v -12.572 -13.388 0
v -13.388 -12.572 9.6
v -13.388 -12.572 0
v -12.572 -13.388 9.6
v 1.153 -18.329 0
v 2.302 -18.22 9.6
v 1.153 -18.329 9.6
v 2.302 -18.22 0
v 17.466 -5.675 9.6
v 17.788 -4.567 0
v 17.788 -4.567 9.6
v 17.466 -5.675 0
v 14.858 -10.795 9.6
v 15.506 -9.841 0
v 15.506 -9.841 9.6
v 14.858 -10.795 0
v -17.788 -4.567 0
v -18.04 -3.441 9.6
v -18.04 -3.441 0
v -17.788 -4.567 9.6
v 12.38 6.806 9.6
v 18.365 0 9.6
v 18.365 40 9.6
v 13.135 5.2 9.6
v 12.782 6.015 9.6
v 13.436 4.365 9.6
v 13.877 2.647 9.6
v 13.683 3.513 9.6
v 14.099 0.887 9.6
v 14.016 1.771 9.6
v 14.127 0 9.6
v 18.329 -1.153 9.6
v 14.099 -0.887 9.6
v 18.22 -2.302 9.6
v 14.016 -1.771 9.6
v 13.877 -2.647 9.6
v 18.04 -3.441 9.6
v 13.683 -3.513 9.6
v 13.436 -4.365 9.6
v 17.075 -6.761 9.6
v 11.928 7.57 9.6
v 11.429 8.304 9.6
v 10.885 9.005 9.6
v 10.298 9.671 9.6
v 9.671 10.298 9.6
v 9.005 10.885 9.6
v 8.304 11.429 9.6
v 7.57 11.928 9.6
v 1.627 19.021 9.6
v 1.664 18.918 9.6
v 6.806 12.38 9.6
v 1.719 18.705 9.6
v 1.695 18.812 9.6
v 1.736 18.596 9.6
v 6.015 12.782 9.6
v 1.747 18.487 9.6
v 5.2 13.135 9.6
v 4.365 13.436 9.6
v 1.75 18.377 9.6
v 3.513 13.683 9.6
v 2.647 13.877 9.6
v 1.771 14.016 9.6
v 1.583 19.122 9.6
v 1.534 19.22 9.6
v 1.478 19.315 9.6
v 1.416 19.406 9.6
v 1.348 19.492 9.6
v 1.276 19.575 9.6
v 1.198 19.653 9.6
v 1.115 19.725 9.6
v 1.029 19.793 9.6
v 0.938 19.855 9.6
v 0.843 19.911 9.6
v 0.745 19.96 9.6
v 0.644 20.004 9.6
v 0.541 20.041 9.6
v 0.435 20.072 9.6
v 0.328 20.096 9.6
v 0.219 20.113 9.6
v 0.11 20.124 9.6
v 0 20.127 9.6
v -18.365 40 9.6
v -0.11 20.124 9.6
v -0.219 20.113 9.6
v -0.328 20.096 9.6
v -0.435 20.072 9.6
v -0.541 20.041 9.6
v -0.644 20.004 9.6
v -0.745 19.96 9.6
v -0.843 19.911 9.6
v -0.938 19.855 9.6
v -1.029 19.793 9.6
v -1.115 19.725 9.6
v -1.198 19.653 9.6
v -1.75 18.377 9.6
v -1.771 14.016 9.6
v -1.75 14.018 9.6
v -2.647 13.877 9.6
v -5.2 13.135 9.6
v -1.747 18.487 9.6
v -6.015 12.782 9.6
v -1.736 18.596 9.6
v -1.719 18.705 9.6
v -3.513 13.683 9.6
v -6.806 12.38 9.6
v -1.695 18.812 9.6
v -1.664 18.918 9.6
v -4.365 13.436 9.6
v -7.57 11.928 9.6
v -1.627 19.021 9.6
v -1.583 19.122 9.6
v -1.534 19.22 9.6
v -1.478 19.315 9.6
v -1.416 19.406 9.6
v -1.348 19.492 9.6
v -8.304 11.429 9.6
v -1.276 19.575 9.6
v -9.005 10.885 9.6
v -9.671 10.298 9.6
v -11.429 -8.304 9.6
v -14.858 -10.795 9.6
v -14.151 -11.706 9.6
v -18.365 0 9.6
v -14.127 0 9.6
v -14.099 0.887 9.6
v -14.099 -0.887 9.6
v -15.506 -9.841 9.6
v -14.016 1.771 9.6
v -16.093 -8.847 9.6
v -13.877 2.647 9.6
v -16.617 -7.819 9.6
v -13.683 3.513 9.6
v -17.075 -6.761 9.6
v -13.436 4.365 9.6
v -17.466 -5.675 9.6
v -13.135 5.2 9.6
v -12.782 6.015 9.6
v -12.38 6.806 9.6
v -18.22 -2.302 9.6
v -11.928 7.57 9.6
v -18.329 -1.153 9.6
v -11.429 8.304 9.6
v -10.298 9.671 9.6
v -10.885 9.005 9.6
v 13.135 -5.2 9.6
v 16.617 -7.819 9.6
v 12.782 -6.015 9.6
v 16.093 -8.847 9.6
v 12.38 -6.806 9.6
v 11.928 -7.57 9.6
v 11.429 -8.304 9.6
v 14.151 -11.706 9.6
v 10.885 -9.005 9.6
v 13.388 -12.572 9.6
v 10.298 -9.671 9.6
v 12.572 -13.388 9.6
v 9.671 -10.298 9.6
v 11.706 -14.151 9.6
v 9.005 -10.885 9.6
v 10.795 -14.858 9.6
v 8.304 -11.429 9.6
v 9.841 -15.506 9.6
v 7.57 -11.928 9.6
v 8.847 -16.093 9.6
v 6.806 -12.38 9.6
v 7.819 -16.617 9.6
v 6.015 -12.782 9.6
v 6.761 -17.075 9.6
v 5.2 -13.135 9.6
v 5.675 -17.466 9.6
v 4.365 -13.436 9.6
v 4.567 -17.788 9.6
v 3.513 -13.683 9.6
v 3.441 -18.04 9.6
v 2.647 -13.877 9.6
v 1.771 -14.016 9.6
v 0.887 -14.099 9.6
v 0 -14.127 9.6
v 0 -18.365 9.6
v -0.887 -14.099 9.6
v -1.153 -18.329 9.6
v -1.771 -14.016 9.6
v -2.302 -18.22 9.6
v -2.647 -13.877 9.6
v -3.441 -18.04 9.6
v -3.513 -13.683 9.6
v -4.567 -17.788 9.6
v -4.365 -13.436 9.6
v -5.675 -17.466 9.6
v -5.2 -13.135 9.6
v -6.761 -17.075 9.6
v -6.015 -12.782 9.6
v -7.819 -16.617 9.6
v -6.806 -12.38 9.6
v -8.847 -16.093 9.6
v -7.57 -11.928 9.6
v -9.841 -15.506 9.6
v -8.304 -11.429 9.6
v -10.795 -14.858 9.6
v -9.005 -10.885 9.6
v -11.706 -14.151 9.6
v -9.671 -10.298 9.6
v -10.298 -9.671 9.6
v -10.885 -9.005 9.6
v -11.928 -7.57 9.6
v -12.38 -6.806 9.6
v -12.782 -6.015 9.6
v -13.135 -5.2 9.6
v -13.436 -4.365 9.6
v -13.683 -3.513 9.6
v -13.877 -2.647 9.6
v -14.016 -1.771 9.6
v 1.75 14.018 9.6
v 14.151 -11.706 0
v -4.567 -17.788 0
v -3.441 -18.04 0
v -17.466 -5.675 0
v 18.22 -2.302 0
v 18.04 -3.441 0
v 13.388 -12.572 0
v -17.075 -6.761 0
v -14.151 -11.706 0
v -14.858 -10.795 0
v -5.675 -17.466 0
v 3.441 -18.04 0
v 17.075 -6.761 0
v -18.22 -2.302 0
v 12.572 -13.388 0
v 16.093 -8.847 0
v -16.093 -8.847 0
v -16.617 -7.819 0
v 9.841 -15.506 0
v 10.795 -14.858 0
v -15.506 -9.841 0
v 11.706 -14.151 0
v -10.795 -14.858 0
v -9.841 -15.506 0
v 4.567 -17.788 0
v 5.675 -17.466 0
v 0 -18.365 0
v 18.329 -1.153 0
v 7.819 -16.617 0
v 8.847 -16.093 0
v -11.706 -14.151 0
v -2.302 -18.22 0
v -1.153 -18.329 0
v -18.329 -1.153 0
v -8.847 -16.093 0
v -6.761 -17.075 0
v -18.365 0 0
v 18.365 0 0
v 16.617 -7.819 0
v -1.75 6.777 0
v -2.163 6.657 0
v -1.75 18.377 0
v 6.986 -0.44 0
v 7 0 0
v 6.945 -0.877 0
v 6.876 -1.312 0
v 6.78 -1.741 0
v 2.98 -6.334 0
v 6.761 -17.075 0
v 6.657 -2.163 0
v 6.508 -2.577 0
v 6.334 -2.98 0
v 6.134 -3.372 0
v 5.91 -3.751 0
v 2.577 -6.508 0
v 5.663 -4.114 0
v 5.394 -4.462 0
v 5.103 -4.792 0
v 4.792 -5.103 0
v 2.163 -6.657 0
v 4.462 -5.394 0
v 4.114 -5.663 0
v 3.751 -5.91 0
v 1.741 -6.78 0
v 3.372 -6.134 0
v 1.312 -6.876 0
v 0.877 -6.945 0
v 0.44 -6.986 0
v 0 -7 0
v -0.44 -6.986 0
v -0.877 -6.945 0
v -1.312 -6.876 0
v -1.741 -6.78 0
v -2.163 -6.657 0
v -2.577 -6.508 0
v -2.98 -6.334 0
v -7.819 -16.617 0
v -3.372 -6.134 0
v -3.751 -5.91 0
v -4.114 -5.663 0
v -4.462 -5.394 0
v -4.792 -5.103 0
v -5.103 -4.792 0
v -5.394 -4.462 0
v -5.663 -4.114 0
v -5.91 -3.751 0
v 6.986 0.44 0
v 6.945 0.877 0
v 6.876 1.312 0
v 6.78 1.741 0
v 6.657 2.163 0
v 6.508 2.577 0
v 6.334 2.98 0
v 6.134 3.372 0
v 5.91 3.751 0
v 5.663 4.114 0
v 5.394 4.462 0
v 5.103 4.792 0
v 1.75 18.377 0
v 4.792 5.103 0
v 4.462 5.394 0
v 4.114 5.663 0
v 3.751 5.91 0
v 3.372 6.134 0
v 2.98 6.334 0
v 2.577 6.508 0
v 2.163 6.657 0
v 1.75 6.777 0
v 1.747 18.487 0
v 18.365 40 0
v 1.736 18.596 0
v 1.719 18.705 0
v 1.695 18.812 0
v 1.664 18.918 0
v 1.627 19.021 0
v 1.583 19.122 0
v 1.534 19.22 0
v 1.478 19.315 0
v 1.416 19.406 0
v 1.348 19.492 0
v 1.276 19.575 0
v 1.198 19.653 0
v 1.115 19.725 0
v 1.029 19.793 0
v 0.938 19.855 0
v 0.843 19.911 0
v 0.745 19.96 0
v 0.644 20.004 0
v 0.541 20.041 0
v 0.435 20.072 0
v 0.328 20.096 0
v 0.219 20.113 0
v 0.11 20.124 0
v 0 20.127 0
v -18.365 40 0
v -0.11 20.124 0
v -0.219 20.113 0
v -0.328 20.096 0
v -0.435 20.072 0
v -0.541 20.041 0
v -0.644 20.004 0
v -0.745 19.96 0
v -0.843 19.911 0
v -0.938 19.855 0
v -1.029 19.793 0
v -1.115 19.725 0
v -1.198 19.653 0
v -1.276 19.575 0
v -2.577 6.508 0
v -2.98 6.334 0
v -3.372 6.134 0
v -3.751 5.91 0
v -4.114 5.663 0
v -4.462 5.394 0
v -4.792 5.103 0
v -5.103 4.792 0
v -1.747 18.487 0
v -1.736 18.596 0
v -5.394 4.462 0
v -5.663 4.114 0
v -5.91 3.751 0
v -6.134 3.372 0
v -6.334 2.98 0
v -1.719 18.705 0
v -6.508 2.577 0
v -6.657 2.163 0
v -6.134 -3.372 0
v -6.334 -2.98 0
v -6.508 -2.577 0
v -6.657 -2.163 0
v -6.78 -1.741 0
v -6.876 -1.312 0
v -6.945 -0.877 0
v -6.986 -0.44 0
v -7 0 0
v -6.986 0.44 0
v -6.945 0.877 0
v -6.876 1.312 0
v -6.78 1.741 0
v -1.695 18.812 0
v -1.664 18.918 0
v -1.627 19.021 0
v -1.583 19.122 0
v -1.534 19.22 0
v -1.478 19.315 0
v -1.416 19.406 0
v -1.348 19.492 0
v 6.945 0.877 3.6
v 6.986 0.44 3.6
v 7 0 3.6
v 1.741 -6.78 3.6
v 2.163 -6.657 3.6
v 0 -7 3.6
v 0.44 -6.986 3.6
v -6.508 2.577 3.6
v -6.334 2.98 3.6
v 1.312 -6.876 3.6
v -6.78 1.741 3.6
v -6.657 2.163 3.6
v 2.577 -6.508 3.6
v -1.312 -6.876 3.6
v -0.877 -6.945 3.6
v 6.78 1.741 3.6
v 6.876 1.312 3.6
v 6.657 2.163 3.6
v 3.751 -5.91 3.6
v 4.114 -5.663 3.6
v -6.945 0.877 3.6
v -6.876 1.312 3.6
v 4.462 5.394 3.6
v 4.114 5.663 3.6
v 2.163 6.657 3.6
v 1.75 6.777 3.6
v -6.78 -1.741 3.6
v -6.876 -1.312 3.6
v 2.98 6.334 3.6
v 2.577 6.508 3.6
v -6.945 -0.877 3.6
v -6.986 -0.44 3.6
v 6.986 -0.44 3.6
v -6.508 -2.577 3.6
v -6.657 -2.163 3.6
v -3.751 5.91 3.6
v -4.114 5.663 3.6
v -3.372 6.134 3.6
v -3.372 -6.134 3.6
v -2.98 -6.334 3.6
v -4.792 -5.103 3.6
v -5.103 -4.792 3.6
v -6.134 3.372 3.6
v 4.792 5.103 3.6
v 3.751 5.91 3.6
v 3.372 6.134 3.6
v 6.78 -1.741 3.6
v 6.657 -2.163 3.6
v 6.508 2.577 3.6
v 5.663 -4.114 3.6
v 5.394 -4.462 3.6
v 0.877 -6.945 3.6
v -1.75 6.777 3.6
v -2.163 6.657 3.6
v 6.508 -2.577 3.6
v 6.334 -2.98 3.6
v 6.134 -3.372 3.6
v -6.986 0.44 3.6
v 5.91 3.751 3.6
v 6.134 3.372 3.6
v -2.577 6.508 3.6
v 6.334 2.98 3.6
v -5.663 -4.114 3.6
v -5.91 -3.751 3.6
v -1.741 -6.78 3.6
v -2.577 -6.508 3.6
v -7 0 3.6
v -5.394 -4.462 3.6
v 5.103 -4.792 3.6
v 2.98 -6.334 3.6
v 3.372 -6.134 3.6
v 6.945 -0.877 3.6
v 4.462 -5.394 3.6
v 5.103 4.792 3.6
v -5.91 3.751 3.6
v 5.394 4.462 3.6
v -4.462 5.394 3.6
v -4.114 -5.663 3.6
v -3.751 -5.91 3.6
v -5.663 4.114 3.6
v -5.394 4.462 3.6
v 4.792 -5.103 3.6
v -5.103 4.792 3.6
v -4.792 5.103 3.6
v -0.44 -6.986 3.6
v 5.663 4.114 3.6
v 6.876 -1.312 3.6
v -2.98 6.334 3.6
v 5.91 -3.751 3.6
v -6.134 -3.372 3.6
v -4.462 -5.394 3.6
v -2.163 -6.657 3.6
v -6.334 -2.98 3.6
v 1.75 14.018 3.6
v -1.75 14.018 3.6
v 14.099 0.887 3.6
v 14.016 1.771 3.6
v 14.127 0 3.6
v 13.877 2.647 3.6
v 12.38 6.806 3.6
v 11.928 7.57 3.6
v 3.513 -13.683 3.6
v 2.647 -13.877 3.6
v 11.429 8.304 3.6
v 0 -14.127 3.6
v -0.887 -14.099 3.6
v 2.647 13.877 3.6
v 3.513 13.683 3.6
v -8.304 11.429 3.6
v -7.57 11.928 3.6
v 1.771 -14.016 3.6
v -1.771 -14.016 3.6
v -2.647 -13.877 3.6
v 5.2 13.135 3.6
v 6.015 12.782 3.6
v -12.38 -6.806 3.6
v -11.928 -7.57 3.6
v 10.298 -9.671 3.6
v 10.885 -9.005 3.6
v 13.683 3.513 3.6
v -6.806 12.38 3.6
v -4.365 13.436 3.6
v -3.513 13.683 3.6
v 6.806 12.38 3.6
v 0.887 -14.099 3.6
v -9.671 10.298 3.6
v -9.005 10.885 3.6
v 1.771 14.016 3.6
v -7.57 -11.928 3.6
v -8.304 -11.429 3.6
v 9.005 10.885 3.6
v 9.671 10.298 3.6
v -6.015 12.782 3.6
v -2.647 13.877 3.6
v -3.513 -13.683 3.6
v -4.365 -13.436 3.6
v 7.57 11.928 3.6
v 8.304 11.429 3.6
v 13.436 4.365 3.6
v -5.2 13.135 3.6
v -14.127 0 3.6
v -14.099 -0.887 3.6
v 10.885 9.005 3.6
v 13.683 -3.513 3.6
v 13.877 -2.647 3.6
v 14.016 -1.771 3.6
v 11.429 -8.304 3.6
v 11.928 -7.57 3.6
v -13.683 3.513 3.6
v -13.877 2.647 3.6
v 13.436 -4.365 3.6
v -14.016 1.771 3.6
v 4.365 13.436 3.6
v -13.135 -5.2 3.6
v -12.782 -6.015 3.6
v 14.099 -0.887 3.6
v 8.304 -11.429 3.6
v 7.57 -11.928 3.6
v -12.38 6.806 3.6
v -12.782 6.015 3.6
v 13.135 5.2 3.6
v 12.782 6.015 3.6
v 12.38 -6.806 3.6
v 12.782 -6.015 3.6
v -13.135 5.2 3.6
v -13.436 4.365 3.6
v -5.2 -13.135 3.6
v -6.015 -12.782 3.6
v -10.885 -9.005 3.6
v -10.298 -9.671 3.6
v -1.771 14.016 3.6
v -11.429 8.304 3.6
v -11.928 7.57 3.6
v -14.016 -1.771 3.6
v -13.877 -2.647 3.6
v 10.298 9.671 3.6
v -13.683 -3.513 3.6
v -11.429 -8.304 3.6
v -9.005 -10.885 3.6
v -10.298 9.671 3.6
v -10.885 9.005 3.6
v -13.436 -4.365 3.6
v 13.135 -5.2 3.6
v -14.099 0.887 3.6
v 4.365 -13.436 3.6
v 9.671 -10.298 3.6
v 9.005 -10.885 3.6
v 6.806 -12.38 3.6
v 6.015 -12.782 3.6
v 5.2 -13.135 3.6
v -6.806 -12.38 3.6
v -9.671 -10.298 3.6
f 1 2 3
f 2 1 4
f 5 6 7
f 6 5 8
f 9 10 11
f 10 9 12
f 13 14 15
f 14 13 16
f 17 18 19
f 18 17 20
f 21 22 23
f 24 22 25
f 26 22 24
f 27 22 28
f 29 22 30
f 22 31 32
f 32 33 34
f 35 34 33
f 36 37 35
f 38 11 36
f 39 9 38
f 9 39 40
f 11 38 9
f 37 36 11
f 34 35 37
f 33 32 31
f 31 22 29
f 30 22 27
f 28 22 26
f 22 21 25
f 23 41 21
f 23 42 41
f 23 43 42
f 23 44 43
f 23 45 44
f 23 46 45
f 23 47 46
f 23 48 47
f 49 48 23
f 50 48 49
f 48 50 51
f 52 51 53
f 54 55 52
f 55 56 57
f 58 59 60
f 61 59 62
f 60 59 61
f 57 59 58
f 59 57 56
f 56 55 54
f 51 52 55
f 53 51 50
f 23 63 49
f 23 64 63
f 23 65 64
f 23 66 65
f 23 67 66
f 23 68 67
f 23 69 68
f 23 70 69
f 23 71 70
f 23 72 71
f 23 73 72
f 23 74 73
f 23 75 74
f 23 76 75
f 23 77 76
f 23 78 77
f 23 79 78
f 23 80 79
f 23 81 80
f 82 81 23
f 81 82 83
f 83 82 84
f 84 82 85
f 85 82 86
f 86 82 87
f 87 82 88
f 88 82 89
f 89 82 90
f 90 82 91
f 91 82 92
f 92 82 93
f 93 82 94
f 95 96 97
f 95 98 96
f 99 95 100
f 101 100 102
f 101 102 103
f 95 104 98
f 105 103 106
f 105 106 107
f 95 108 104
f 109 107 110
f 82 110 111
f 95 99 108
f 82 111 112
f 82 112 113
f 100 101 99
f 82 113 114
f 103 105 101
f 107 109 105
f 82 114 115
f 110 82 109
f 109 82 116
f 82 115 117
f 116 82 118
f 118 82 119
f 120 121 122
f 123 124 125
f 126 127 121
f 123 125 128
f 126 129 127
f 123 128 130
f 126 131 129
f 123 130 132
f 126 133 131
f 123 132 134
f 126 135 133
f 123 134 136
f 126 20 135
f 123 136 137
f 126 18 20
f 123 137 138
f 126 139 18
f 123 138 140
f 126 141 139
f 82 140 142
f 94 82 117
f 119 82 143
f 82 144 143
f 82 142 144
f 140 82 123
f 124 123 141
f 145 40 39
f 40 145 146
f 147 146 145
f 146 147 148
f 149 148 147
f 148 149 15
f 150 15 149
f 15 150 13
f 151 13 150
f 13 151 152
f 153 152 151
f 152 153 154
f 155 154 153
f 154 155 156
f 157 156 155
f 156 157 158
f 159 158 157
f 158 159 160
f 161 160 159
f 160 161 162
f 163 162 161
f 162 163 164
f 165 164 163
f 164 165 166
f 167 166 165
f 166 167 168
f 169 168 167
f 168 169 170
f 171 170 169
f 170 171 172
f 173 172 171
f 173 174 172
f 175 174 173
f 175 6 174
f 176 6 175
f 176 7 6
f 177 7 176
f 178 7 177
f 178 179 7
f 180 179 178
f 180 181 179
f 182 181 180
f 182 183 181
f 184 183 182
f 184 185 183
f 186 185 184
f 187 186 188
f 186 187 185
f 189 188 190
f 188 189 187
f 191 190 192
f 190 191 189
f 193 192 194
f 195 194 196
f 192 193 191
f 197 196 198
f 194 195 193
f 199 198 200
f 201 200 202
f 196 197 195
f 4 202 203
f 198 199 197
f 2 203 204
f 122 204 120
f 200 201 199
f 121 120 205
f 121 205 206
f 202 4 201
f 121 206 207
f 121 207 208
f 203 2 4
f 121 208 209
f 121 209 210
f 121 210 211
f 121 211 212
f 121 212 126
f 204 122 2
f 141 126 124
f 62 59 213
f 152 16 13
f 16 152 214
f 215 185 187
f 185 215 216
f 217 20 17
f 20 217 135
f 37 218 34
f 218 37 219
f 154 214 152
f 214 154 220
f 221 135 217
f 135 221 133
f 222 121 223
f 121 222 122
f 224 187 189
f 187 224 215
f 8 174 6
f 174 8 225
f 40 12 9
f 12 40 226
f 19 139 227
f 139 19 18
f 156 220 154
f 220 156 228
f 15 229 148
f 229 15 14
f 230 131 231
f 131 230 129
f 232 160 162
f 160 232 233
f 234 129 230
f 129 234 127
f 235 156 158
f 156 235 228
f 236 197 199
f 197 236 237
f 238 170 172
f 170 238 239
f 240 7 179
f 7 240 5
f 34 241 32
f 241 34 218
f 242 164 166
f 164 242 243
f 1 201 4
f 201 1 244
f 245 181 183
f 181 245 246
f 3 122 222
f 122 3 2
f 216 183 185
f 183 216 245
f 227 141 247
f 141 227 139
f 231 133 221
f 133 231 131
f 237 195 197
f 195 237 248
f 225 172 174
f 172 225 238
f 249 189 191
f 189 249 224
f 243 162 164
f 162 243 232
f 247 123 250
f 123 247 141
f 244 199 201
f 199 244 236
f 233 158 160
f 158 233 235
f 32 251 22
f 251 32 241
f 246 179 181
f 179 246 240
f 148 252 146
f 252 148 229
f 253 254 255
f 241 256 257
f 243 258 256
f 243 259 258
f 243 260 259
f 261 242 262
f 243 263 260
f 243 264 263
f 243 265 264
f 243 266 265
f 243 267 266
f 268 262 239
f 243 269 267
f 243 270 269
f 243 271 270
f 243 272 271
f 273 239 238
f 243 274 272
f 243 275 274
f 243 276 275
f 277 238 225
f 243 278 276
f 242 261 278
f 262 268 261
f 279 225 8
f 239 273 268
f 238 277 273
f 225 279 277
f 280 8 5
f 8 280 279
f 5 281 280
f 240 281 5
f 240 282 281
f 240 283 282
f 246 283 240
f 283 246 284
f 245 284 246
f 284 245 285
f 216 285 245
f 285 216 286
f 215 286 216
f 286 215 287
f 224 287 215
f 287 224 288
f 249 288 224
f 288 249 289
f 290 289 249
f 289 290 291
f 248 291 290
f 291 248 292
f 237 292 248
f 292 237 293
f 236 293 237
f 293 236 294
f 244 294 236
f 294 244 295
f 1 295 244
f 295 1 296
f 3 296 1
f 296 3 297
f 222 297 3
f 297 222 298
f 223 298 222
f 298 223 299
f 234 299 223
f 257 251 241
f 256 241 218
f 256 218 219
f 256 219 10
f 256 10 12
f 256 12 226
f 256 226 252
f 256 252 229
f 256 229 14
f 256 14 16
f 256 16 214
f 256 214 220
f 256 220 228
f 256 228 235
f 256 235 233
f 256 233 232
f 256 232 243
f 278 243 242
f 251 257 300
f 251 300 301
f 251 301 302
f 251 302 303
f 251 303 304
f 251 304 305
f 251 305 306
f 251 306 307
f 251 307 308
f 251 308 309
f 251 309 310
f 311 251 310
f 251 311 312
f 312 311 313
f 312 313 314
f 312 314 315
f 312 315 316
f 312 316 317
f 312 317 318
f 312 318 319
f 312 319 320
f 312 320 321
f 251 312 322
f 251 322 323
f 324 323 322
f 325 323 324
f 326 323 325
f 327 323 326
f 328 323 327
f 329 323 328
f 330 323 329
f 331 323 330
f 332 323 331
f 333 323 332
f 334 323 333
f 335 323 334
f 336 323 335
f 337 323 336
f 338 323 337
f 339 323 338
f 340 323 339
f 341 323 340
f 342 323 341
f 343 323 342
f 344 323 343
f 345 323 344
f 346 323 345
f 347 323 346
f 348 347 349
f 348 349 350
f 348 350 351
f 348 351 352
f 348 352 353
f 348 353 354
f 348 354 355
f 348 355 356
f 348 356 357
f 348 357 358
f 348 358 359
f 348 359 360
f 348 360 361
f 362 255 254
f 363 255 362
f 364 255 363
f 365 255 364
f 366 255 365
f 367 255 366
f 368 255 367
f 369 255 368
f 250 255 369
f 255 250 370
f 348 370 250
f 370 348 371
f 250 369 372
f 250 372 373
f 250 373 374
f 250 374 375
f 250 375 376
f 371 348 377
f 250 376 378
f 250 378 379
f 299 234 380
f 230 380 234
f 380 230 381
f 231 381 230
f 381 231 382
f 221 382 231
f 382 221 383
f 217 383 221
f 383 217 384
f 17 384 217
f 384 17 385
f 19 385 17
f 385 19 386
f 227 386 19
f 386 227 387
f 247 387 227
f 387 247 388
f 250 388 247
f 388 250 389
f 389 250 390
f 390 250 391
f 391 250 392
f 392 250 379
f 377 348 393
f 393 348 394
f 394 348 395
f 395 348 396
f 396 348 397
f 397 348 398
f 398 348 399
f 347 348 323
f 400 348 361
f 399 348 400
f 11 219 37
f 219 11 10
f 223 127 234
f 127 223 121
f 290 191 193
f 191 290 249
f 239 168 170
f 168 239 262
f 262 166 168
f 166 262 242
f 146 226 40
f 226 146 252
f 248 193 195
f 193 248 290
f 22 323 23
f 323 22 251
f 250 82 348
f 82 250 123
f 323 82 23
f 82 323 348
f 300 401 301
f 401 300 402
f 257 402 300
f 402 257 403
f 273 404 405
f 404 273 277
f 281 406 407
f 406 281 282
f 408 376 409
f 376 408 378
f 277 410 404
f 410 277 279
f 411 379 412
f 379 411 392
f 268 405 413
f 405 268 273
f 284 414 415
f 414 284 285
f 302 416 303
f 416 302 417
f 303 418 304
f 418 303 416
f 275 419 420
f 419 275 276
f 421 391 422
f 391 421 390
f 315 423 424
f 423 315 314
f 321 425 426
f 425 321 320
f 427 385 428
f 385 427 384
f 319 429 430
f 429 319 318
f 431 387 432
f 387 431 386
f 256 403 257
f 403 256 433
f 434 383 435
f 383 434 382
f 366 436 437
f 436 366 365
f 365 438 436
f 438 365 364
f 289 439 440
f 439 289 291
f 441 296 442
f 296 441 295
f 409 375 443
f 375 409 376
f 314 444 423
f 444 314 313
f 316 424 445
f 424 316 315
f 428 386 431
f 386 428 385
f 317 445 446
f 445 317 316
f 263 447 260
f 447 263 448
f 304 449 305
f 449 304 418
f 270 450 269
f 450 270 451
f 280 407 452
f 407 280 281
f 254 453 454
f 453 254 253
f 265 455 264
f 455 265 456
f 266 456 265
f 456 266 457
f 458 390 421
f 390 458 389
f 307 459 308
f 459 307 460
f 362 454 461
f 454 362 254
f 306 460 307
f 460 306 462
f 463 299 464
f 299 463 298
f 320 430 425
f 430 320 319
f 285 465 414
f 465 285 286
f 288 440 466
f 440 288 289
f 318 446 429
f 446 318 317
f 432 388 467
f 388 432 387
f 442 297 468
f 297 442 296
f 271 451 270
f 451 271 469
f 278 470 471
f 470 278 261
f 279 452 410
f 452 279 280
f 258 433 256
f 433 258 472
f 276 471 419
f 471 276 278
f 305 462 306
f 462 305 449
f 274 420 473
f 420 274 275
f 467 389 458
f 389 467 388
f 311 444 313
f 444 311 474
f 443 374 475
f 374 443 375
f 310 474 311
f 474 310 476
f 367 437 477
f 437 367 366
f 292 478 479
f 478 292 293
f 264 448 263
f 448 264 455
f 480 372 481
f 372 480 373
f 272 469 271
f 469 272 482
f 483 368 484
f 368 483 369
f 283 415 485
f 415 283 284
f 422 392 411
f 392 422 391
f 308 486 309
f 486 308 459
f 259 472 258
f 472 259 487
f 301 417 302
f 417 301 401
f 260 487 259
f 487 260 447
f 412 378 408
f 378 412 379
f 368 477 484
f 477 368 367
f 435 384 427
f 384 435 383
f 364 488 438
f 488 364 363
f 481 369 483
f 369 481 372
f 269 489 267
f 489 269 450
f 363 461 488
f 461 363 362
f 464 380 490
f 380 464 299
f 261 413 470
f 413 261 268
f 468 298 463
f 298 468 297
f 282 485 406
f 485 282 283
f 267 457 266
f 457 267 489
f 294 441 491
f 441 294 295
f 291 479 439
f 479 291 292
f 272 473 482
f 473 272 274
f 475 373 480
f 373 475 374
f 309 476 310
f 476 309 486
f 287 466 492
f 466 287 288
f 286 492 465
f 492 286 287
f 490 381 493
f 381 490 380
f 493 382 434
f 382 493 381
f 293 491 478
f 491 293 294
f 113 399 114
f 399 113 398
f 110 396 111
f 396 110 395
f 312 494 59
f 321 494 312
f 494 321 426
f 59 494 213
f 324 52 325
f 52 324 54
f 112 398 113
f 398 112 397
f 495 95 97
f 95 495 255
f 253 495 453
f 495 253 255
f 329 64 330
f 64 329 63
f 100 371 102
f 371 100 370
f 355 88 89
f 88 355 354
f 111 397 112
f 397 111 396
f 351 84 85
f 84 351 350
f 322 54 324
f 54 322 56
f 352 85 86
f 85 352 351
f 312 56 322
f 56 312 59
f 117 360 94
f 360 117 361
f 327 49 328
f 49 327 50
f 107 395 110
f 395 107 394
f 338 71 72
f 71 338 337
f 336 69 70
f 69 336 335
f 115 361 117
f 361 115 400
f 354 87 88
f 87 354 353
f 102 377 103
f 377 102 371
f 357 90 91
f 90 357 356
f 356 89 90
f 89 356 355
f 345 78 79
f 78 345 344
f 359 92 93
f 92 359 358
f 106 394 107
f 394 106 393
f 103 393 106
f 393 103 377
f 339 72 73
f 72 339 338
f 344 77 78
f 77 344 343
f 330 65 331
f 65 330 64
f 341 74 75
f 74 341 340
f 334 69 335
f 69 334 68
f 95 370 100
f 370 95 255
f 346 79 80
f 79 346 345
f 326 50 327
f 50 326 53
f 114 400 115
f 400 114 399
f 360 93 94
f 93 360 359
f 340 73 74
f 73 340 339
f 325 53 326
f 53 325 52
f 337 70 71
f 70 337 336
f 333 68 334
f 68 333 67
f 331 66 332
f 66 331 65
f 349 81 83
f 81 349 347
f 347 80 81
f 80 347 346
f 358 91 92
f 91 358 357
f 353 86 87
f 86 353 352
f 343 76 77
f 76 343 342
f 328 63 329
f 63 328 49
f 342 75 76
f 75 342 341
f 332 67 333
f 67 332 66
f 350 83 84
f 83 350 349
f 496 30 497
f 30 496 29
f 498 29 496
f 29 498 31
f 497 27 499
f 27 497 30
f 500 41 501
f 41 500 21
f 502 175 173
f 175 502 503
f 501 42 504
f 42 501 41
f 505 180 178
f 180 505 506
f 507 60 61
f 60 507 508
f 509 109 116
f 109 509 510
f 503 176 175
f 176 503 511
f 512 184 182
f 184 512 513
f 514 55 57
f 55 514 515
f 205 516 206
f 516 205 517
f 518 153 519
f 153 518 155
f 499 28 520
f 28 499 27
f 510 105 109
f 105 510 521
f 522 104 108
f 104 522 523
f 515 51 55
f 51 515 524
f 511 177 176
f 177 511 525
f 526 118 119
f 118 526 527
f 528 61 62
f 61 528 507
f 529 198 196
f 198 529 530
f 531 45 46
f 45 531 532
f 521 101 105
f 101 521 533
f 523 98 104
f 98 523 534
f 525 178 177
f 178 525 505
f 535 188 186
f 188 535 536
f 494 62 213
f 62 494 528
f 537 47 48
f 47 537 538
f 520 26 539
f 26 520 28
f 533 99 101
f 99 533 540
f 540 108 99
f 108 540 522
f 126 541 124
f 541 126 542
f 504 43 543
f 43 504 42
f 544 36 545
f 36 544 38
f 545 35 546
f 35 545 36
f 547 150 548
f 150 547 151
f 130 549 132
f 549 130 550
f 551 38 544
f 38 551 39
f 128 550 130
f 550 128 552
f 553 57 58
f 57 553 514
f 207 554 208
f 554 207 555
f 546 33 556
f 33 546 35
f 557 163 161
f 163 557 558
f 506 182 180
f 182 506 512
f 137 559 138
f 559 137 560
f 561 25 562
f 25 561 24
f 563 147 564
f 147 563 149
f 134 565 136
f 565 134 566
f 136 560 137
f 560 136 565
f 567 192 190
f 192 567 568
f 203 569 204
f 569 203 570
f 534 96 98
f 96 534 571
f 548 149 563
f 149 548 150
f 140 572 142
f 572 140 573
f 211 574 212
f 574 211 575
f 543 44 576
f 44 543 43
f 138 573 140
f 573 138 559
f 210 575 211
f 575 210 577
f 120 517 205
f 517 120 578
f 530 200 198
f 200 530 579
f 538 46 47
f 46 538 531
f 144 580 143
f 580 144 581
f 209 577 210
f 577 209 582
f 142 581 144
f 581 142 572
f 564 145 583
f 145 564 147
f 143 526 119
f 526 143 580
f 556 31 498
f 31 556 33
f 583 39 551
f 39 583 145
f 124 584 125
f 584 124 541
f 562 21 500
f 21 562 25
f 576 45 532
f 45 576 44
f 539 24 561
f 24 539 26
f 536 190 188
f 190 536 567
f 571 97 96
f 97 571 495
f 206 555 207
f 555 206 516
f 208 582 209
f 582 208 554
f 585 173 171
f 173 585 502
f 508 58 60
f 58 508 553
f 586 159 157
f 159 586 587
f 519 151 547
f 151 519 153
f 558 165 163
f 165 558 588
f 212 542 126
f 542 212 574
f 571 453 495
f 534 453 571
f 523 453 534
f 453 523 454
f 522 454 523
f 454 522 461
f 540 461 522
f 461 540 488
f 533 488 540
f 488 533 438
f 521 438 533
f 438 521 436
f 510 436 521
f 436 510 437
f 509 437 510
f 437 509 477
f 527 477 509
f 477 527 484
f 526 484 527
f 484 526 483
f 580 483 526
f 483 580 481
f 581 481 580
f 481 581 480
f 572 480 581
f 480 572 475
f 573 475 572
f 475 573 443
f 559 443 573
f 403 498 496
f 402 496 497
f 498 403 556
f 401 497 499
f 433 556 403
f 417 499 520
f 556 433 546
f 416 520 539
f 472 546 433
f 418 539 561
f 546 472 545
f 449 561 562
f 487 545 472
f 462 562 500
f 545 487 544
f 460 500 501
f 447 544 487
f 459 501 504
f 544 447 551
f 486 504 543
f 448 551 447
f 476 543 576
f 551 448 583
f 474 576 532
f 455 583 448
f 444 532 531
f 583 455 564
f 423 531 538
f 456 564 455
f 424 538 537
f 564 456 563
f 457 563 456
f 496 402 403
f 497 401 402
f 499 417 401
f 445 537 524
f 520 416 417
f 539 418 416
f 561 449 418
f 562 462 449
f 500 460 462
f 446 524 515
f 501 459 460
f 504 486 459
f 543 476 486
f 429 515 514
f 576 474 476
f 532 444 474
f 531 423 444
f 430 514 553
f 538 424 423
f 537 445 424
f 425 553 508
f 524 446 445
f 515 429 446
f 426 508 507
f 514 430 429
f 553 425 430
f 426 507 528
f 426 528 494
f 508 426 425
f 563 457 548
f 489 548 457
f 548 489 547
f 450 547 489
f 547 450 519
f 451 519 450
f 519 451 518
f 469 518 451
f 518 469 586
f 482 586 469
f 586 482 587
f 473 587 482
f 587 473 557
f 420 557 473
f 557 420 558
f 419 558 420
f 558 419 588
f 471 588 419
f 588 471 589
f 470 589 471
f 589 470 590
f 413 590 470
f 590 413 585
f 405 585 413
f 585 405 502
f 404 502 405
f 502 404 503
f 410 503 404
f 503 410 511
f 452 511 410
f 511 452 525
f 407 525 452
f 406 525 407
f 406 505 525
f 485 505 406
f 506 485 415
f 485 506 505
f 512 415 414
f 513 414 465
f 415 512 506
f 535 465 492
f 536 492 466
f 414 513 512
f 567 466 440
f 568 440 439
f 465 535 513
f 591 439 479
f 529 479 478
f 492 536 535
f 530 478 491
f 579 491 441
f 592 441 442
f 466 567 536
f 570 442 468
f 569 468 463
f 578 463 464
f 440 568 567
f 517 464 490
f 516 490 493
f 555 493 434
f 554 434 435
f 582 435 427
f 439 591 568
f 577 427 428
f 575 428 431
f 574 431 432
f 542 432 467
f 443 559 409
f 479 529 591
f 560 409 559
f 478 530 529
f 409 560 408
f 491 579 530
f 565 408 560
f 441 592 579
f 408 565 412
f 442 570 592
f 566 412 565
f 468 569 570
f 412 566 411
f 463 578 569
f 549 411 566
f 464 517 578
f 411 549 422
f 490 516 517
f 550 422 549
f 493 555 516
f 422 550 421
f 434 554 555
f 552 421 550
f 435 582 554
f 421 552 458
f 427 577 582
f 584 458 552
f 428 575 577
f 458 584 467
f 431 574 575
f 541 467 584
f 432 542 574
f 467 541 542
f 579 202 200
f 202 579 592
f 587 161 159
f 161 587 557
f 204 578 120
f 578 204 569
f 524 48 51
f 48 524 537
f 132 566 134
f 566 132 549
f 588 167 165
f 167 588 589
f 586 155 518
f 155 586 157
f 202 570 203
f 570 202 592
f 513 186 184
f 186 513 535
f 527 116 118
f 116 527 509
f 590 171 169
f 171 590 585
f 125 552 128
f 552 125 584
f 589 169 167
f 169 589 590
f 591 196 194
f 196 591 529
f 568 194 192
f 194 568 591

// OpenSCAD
$fn=100;

actual_core_dia = 27.7;
core_dia = actual_core_dia * 1.02;
core_thickness = 6;

core_ext_dia = core_dia * 1.3;
body_thickness = core_thickness * 1.6;
cable_allowance = 6;
cable_thickness = 3;

gravestone_shaft_height = 40;

connector_width = 13;

module rounded_box() {
    minkowski() {
        cube([10, 10, 10]);
        sphere(3);
    }
}

module power_cutout() {
    slot_dia = cable_thickness + 0.5;
    cylinder(body_thickness, d = connector_width+1);
    hull() {
        cylinder(body_thickness, d = slot_dia);
        translate([0, core_dia * 0.5 - slot_dia/2 + cable_allowance, 0]) cylinder(body_thickness, d = slot_dia);
    }
}

module gravestone() {
    cylinder(body_thickness, d = core_ext_dia);
    translate([-core_ext_dia/2, 0, 0]) cube([core_ext_dia, gravestone_shaft_height, body_thickness]);
}

module charger_cutout() {
    translate([0, 0, body_thickness - core_thickness]) cylinder(core_thickness, d = core_dia);
        power_cutout();
}

module body() {
    difference() {
        gravestone();
        charger_cutout();
    }
}

body();
//rounded_box();
